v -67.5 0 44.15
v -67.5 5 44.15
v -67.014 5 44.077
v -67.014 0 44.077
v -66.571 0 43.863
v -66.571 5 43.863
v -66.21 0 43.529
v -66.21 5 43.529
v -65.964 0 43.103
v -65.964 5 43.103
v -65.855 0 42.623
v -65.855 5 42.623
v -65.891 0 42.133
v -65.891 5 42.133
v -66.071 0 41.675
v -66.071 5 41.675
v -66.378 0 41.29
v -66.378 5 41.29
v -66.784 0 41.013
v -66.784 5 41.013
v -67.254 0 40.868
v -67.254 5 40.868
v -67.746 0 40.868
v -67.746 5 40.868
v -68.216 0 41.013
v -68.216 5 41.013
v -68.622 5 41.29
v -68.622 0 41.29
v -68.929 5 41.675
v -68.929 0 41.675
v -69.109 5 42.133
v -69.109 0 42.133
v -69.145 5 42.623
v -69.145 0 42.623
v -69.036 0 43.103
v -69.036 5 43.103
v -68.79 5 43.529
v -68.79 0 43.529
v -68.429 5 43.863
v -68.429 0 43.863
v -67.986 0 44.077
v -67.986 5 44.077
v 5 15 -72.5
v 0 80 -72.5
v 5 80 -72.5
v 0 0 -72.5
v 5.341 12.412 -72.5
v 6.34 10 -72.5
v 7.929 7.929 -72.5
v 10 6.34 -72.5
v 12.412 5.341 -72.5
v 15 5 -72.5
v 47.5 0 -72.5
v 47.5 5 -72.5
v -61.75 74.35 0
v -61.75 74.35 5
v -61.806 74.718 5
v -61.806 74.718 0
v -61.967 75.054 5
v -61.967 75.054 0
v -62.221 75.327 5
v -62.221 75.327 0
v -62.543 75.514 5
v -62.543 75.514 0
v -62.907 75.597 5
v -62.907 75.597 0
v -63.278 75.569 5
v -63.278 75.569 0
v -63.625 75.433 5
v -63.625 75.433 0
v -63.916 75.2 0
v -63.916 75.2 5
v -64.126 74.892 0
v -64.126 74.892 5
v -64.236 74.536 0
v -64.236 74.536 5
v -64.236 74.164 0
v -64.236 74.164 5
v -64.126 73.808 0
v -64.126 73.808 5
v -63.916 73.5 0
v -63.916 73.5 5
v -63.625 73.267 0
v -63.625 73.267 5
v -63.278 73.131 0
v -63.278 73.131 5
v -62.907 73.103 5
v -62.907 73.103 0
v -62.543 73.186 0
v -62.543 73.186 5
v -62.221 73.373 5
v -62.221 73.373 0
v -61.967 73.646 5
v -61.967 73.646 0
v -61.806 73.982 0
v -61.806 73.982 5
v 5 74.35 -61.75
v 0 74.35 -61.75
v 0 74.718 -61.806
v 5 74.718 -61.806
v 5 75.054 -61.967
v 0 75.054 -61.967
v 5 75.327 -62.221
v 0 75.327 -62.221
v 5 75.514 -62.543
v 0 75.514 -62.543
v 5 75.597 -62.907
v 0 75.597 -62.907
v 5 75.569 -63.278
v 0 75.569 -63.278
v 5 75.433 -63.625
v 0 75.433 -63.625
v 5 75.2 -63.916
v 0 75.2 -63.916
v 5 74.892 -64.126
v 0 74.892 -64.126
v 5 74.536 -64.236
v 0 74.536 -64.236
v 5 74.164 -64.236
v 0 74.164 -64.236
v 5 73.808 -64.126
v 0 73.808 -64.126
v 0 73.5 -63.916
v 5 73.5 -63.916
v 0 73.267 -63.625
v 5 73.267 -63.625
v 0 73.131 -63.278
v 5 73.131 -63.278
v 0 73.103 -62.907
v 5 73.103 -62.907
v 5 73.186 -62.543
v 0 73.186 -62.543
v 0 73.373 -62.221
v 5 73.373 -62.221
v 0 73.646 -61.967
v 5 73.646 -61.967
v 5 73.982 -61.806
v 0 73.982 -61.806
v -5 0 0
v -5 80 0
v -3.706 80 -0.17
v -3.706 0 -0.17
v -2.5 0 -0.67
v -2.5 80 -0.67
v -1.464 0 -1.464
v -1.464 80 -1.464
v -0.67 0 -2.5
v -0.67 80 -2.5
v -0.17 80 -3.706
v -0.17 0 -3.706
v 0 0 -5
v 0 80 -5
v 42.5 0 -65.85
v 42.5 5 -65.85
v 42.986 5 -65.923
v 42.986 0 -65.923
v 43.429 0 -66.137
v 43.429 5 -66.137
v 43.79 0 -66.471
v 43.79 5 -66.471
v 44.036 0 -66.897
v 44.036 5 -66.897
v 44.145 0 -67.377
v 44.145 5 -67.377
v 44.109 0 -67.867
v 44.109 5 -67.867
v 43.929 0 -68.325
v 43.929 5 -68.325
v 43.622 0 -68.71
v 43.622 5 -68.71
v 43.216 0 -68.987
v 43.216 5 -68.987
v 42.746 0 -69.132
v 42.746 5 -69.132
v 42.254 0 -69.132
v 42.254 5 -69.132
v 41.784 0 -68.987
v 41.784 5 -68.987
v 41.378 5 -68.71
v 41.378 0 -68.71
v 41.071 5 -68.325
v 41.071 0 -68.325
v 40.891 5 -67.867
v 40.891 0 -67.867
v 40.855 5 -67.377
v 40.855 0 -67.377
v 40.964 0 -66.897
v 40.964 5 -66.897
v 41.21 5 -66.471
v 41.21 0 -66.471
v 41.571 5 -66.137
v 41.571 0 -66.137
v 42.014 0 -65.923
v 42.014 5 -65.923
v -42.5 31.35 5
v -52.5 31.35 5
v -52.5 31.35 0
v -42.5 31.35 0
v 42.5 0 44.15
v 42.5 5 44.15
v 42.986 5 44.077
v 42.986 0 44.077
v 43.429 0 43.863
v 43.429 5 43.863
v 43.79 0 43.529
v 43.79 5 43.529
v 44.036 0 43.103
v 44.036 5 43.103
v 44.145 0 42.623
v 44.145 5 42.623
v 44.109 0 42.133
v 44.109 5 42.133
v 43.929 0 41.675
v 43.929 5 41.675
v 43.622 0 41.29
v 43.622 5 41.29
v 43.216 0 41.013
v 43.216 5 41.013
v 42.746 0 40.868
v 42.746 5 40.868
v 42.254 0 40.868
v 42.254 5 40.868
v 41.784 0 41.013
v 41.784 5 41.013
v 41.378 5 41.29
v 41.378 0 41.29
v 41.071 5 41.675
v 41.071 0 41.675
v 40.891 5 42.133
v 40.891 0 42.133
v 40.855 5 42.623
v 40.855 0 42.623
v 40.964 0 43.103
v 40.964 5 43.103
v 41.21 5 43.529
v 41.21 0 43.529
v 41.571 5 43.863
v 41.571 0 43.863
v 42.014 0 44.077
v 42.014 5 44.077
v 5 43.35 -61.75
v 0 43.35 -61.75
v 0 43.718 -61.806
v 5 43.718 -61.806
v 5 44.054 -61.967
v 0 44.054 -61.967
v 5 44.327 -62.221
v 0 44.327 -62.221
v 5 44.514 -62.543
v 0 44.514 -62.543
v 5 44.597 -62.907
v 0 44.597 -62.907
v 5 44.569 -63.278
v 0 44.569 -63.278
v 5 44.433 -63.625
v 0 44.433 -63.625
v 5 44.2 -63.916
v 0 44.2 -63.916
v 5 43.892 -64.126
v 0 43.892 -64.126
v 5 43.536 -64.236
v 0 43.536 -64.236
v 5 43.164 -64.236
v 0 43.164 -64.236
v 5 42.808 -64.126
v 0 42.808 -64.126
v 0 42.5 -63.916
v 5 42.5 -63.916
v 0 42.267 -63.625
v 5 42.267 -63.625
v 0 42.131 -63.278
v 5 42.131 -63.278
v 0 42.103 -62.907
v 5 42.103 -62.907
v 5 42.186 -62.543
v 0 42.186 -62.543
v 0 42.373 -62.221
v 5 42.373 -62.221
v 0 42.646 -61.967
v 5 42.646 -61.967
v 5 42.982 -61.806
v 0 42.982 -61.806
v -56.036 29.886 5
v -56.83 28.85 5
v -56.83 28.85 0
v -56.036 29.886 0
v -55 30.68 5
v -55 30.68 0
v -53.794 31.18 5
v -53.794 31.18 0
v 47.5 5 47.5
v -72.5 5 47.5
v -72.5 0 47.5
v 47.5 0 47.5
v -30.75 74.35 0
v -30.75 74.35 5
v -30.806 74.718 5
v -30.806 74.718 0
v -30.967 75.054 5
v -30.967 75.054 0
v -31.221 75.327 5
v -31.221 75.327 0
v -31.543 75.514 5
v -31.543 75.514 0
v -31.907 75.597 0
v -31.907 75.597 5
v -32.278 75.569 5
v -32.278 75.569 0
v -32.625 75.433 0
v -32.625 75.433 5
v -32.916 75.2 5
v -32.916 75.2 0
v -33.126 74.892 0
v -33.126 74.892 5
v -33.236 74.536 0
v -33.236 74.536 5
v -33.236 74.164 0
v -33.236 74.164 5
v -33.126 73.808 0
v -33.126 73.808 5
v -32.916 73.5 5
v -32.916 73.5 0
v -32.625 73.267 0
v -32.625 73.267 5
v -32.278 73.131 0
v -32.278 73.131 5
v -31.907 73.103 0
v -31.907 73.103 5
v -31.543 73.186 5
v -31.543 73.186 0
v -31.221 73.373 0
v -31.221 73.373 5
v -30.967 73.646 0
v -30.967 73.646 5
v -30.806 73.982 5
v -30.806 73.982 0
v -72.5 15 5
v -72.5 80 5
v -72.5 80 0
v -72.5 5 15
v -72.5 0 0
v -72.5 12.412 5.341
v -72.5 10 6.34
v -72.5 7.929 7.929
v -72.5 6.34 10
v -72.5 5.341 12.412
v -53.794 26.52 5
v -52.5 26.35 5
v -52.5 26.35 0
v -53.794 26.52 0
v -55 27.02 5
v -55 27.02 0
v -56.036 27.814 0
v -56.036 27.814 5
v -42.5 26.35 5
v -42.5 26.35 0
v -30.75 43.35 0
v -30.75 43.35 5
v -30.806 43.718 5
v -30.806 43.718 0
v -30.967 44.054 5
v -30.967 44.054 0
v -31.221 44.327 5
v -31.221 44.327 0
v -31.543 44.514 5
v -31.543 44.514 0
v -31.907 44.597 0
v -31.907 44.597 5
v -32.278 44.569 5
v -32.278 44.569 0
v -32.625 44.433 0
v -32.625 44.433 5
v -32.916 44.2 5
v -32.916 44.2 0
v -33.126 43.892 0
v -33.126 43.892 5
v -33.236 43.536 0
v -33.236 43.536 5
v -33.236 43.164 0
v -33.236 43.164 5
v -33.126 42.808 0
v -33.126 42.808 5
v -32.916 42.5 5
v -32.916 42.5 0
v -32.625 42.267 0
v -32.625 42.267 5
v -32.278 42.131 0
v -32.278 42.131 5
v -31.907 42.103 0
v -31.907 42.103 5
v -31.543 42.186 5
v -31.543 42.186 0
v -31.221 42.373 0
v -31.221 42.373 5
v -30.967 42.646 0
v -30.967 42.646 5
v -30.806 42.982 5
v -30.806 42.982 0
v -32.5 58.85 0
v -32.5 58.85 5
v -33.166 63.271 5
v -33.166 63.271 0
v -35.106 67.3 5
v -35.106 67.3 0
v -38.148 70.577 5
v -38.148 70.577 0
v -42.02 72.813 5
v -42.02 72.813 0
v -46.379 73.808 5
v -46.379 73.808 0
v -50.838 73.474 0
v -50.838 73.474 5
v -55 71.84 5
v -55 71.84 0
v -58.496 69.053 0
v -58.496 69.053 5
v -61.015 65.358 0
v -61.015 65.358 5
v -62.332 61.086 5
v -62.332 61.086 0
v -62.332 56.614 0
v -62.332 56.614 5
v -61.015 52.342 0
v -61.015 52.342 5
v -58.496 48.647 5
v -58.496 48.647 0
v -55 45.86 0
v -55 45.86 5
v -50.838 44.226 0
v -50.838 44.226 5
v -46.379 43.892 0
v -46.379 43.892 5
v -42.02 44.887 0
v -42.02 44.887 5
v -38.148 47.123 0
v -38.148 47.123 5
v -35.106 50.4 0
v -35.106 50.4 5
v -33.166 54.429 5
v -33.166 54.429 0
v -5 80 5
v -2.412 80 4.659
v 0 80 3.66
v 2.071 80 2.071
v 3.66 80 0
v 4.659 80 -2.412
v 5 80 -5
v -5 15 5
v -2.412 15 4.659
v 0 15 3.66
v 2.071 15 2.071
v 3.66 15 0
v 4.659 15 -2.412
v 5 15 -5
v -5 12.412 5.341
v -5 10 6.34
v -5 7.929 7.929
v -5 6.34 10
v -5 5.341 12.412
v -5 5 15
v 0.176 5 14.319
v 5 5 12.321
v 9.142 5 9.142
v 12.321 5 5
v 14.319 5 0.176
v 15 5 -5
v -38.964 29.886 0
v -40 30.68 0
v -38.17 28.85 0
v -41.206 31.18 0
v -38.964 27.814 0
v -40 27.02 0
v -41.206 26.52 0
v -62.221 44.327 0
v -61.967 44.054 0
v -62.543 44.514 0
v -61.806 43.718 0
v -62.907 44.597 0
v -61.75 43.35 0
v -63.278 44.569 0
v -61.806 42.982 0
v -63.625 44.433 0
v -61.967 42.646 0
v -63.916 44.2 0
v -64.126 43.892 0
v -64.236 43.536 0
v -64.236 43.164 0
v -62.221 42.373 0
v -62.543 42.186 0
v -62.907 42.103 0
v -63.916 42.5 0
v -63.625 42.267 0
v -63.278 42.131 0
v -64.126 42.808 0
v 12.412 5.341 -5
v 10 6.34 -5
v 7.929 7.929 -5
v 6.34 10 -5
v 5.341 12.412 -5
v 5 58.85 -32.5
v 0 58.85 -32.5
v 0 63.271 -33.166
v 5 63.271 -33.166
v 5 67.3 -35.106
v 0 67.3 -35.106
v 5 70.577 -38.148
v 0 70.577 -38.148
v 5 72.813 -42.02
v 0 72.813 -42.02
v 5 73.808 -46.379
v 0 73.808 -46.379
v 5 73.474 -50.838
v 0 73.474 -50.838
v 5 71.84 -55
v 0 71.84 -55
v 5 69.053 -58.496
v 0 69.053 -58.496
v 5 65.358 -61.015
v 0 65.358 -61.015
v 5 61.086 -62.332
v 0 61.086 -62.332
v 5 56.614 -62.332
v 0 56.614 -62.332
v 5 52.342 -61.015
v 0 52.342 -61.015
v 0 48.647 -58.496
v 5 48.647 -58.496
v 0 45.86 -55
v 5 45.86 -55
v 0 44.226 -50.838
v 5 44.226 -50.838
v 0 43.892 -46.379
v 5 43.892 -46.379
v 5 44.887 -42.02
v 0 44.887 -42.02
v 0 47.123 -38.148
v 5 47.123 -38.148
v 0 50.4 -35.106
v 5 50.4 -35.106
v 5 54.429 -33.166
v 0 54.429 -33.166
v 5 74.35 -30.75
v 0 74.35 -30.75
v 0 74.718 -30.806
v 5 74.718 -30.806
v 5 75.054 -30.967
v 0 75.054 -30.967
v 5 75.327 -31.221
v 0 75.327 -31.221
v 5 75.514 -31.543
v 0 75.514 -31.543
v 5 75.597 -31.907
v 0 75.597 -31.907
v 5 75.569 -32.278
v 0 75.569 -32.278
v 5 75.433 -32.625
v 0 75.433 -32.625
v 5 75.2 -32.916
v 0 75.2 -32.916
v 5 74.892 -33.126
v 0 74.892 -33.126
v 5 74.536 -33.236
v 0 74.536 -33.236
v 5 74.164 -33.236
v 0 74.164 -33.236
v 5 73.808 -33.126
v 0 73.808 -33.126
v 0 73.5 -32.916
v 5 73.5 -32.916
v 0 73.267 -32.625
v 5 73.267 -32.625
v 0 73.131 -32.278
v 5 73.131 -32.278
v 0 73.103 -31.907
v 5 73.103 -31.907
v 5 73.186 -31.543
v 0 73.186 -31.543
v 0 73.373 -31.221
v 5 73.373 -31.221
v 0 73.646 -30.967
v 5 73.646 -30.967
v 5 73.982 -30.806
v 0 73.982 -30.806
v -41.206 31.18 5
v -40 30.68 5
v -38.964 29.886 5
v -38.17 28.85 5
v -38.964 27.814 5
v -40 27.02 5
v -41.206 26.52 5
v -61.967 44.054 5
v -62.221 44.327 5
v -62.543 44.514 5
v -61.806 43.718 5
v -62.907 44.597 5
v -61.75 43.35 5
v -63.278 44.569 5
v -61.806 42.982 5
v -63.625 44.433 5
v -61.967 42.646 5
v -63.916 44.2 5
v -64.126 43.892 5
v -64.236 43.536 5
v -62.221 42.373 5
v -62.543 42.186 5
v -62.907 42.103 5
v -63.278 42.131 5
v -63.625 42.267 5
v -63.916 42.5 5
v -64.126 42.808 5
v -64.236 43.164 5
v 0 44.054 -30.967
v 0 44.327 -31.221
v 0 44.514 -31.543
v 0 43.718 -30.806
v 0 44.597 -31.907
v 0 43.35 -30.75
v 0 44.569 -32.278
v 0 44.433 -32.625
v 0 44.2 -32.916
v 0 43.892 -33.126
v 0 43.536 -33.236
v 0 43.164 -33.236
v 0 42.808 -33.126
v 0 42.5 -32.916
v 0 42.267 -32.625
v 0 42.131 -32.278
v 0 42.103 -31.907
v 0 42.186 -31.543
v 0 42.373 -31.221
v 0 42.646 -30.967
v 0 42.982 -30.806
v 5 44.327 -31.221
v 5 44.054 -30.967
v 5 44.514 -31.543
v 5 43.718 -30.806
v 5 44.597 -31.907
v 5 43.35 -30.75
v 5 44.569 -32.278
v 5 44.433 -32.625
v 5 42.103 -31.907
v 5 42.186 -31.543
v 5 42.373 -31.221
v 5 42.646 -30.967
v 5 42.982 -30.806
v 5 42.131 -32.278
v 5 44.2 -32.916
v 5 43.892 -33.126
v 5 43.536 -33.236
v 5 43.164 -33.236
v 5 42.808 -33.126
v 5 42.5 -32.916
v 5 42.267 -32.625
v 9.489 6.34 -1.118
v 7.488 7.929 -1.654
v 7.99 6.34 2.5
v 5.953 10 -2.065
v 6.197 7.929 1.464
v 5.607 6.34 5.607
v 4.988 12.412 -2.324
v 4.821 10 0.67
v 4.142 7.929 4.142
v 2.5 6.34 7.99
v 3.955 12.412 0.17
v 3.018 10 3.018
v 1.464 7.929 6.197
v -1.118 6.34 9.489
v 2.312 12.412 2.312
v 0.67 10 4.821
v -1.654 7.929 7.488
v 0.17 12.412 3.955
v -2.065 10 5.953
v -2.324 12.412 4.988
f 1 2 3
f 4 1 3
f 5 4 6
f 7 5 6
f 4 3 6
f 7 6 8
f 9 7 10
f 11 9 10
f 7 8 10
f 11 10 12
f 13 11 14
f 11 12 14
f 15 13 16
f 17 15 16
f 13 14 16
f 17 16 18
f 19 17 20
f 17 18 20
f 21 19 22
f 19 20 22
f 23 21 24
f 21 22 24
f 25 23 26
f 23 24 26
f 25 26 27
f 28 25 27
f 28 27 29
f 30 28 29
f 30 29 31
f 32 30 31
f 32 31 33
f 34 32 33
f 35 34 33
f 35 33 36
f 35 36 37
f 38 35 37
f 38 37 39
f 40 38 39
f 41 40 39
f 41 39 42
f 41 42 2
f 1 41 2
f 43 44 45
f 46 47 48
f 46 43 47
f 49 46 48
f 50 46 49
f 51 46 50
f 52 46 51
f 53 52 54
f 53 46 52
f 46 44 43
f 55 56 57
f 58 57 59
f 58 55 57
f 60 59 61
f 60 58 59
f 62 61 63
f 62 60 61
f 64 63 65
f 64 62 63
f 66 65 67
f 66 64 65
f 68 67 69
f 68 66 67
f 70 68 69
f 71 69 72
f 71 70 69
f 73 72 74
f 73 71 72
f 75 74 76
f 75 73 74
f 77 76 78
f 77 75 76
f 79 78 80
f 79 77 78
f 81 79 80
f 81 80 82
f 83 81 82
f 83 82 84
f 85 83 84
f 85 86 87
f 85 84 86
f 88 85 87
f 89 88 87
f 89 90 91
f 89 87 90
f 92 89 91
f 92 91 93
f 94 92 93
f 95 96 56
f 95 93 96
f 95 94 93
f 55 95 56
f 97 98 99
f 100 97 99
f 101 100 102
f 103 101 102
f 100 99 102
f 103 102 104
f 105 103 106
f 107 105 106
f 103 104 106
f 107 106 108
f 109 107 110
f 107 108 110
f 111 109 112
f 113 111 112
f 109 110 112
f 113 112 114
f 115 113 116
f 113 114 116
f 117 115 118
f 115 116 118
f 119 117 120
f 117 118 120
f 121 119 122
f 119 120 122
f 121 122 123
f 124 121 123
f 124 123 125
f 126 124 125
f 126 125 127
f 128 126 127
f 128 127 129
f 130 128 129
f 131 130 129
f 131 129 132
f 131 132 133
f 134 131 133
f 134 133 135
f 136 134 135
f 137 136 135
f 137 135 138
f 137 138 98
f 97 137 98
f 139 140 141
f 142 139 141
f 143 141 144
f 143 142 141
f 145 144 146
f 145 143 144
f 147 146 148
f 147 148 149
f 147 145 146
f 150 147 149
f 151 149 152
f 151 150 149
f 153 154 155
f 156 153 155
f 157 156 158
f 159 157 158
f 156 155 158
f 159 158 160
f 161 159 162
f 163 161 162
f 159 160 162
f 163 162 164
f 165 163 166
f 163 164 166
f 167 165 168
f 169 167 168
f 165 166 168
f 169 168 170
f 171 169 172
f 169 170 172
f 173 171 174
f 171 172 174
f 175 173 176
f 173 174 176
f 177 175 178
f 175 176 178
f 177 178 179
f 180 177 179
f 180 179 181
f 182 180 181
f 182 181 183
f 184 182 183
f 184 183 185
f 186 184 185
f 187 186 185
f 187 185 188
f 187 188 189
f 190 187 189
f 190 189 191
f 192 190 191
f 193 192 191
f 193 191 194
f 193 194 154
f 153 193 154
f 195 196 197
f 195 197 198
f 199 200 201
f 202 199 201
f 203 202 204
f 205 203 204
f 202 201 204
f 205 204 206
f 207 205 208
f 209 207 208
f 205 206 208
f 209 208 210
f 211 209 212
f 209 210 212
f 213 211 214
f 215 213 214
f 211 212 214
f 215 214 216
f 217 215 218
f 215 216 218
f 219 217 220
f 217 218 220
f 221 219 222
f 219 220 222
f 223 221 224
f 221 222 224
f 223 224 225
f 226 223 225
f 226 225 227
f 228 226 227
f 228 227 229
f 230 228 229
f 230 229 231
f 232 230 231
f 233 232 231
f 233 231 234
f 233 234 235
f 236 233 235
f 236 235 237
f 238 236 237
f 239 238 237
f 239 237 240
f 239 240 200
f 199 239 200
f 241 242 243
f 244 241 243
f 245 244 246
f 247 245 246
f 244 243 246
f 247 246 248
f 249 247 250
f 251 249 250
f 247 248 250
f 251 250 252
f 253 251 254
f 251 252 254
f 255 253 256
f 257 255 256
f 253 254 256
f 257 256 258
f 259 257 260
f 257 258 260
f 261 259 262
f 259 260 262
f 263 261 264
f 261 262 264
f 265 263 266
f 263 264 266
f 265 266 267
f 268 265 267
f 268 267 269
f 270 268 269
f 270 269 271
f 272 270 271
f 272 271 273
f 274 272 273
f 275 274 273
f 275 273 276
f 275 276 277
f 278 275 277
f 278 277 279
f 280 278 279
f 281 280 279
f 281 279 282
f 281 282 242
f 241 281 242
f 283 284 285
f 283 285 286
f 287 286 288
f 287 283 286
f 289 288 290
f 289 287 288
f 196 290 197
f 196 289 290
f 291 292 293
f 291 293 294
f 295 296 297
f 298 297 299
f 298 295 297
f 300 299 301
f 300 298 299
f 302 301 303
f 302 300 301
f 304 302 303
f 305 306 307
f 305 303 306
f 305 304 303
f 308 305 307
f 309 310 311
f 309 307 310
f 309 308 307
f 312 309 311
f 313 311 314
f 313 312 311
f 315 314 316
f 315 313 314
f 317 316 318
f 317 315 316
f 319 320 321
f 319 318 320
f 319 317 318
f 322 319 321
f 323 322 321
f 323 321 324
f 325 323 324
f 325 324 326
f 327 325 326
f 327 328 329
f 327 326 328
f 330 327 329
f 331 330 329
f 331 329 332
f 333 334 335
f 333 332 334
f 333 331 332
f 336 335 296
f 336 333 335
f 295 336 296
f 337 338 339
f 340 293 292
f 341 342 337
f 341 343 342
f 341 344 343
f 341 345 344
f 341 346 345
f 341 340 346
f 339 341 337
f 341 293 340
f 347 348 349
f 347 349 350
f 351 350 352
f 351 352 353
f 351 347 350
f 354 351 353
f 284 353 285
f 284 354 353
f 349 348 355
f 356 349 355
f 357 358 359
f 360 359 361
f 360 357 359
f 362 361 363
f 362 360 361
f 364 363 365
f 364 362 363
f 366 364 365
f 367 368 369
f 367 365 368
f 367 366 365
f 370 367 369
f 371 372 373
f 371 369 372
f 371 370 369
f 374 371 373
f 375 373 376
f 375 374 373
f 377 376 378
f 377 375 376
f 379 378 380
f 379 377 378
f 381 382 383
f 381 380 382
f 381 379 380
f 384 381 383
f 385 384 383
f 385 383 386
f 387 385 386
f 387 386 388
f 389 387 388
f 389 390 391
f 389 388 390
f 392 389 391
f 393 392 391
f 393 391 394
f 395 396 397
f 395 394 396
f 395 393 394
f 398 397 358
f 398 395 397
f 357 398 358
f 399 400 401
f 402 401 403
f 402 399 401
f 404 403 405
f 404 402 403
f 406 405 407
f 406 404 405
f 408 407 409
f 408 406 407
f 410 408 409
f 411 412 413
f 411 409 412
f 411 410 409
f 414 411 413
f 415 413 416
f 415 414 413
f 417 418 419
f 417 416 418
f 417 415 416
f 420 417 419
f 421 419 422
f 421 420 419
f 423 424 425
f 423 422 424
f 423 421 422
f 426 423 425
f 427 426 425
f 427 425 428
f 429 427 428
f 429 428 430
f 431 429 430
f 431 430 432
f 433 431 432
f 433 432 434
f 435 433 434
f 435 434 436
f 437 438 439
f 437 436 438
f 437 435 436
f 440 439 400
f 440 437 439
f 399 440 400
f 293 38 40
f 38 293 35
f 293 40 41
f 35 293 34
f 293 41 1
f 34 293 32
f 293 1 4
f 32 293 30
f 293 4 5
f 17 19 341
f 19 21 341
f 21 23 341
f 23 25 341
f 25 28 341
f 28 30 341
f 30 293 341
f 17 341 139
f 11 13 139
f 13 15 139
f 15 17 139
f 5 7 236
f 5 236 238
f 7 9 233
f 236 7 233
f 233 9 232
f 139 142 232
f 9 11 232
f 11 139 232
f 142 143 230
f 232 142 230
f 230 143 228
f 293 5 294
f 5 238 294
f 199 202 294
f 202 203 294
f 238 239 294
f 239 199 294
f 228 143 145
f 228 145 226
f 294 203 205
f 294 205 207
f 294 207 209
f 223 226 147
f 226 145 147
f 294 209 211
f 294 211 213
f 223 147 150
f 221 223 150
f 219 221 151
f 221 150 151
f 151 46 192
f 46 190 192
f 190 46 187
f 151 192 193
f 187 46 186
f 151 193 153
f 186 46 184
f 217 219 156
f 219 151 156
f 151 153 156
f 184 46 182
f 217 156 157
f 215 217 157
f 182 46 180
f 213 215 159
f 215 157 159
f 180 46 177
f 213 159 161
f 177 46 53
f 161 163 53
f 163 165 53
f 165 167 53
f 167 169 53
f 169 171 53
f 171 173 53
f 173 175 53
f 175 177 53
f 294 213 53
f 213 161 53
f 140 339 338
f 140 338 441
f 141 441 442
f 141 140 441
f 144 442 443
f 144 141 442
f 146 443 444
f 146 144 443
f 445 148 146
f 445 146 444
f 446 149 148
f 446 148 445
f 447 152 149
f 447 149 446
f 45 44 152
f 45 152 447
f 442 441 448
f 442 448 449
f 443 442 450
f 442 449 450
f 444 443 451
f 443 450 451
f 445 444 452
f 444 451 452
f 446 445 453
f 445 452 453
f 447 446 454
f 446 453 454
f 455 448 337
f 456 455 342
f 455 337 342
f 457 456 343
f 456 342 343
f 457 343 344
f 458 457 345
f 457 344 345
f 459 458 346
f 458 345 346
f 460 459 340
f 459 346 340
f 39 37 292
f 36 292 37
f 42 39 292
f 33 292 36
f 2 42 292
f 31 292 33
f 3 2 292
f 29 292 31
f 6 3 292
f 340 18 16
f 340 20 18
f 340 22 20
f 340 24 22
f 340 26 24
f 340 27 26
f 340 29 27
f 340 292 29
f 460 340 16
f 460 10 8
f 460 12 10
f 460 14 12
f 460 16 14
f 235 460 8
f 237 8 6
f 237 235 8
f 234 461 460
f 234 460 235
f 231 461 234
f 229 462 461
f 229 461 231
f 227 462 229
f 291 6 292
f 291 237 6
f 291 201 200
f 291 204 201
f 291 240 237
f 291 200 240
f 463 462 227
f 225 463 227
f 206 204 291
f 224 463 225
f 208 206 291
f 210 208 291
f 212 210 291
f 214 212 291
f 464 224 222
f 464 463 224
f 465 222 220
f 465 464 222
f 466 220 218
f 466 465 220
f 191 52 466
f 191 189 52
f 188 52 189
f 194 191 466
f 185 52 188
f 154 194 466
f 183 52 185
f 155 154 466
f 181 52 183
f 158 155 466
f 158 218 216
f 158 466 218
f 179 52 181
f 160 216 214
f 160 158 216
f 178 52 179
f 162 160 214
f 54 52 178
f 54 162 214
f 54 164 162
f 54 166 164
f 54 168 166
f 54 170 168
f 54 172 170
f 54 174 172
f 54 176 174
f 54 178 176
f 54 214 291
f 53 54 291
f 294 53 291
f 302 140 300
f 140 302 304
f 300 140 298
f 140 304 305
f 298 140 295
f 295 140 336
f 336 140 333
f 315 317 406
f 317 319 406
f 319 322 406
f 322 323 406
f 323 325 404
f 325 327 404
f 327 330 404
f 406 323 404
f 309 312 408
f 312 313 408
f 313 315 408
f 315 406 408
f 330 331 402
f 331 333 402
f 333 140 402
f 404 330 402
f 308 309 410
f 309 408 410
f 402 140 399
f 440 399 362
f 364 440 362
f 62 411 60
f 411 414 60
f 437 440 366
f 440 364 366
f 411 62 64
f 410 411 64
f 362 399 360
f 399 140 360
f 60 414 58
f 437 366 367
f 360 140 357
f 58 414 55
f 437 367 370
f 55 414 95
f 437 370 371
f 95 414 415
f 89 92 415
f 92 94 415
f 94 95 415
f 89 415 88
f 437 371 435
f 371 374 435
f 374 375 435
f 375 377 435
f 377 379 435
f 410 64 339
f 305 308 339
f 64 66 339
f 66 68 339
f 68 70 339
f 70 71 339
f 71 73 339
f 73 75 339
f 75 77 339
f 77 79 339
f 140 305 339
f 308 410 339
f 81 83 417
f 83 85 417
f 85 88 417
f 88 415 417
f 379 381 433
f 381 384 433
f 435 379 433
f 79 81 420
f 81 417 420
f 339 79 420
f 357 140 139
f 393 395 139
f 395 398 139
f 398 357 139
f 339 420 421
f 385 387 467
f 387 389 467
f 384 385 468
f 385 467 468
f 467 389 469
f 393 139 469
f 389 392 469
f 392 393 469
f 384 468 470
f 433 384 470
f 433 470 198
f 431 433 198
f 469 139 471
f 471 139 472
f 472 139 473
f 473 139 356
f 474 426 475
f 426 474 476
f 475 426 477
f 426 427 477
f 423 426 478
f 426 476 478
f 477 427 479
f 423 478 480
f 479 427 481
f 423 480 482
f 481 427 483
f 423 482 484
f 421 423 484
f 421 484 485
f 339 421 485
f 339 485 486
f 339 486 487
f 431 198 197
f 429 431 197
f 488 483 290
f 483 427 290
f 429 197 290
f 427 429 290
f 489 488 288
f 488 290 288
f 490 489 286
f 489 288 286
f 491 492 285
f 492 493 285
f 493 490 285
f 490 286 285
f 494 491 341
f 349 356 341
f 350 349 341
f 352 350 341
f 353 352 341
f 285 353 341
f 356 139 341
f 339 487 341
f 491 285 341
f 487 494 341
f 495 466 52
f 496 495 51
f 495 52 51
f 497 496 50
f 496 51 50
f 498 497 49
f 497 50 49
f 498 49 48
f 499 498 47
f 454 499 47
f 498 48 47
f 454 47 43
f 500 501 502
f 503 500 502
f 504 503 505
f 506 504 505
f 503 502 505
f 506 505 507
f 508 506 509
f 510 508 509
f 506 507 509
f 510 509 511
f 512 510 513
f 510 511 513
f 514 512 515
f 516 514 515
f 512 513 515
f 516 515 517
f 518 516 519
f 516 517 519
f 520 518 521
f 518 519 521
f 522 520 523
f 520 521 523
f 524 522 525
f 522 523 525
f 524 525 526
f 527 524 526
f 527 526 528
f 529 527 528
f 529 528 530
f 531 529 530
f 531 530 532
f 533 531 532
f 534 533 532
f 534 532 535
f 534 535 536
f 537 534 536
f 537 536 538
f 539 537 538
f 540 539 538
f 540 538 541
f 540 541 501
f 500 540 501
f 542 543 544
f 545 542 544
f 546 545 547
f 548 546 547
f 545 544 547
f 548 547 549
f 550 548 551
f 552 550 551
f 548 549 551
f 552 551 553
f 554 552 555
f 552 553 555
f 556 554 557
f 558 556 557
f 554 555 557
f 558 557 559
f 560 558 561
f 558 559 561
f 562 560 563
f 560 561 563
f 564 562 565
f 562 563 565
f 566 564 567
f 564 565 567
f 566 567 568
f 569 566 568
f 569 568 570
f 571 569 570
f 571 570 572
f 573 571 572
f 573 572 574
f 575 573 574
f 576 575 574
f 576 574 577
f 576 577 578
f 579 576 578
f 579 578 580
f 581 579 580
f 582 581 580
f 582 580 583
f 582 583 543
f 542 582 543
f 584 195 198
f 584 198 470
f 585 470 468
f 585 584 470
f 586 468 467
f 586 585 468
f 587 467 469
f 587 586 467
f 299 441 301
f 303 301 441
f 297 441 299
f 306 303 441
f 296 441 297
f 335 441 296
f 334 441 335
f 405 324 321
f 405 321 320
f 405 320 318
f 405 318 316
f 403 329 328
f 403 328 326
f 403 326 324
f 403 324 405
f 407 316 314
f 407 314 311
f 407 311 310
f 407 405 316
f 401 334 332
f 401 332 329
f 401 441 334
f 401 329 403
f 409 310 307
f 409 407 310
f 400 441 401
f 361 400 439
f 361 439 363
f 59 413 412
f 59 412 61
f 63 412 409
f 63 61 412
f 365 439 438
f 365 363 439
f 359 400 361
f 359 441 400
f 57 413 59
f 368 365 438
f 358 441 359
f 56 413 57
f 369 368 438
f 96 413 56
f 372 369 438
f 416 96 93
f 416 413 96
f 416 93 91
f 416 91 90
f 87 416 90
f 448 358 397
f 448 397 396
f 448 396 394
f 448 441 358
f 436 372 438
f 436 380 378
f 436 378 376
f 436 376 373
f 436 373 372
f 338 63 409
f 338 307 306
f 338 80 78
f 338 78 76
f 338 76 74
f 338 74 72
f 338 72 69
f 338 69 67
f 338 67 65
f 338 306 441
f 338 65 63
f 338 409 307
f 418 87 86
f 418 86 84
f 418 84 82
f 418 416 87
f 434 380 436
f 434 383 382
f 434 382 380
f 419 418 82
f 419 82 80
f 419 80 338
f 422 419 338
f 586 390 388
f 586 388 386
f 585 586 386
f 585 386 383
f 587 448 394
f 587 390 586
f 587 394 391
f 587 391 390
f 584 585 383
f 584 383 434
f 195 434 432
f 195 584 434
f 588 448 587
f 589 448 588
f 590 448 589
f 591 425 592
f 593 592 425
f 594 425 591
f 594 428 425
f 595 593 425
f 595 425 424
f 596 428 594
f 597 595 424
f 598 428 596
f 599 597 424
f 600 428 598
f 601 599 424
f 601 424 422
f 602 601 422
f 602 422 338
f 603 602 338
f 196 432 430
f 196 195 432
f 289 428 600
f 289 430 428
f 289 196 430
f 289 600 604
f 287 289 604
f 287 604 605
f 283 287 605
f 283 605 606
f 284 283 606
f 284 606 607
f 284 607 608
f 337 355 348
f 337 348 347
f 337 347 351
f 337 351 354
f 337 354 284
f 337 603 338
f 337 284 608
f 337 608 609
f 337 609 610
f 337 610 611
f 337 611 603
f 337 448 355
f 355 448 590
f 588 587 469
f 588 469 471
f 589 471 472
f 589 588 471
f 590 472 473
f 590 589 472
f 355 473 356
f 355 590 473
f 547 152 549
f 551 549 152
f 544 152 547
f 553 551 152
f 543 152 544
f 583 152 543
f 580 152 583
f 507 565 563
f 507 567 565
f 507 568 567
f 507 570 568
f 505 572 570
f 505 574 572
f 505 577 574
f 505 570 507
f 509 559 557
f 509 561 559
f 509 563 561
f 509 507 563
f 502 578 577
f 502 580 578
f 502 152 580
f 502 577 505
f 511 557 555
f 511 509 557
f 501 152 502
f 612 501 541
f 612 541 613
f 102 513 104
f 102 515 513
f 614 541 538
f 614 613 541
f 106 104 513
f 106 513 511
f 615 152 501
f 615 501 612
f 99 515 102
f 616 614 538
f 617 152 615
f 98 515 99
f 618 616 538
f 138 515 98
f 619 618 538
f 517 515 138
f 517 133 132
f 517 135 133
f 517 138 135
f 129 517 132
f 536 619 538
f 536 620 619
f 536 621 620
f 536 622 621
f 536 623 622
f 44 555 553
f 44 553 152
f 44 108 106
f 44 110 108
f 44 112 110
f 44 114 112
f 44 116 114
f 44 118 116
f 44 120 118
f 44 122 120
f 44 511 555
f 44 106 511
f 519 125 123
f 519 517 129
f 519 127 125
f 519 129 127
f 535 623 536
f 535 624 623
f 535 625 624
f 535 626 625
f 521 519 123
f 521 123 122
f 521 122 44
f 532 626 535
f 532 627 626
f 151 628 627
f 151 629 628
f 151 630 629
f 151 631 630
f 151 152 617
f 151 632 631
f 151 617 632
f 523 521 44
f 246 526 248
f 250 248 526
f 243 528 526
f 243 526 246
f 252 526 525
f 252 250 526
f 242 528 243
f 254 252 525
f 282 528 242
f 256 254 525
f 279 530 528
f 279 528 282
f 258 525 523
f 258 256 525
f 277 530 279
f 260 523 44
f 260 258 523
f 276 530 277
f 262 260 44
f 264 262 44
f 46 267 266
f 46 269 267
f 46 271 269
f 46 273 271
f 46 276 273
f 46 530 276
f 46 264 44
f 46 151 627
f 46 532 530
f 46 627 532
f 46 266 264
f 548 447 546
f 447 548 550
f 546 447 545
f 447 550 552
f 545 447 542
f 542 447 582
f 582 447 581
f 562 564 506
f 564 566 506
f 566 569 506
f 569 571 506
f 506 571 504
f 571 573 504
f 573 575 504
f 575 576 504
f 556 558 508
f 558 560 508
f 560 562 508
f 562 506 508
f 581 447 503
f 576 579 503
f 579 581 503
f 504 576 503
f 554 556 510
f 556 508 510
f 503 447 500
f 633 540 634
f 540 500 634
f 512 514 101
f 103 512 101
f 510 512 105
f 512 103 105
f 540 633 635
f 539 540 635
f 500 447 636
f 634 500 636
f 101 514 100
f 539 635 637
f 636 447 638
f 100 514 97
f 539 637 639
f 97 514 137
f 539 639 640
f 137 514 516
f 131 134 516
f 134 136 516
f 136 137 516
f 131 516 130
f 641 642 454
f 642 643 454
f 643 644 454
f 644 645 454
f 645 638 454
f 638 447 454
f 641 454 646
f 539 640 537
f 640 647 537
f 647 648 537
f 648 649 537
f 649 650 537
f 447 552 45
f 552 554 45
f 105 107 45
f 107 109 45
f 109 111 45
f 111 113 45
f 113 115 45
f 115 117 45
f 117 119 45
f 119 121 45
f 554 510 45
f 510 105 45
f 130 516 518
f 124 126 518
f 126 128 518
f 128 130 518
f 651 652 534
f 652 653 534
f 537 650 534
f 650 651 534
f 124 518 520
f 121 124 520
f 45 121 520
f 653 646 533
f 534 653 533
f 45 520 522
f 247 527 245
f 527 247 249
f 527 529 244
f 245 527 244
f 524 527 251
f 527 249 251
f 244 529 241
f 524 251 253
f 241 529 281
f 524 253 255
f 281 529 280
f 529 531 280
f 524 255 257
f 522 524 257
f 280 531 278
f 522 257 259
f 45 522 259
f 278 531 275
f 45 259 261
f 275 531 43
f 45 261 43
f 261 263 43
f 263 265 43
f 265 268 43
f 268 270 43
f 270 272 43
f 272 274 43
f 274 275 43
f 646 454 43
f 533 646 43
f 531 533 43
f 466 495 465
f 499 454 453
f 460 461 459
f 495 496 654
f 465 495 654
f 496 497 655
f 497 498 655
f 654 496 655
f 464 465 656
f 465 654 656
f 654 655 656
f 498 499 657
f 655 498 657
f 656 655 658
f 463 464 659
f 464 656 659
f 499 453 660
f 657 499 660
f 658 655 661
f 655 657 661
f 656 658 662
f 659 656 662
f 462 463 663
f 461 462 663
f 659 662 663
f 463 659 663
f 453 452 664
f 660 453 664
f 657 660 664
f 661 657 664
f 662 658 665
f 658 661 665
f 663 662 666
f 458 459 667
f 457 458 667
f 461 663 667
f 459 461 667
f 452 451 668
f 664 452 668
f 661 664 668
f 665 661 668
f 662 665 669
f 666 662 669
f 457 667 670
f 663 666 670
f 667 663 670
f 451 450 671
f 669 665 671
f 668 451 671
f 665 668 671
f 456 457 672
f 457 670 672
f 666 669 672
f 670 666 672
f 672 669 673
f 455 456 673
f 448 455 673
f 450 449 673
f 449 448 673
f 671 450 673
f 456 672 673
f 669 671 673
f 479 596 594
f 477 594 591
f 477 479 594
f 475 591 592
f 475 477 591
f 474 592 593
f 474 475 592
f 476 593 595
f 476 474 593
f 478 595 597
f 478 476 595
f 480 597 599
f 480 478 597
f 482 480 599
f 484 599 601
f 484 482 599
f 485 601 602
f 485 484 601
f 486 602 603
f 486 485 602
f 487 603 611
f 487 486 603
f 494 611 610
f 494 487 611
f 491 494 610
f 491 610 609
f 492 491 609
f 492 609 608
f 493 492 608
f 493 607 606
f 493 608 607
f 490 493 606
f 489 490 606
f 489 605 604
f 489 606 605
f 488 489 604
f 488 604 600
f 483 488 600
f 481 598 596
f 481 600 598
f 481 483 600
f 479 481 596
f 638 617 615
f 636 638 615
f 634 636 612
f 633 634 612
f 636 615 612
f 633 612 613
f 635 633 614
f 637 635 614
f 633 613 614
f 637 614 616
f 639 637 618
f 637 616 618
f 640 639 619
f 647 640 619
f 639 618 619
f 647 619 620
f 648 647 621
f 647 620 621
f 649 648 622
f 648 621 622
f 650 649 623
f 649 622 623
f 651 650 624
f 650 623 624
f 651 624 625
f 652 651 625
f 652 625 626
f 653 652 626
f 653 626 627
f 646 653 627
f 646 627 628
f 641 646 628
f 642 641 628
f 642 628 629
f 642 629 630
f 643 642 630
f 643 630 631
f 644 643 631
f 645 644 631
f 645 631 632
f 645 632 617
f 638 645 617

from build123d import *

# Parameters (mm, degrees)
BOSS_EXTRUDE1_DEPTH = 20
SKETCH2_W           = 5
SKETCH2_H           = 72.5
BOSS_EXTRUDE2_DEPTH = 60
SKETCH3_R           = 15
CUT_EXTRUDE1_DEPTH  = 100
SKETCH4_R           = 1.25
CUT_EXTRUDE2_DEPTH  = 100
SKETCH7_W           = 77.5
SKETCH7_H           = 5
BOSS_EXTRUDE6_DEPTH = 60
FILLET3_R           = 5
SKETCH8_W           = 25
SKETCH8_H           = 120
SKETCH8_H_2         = 25
SKETCH8_W_2         = 120
CUT_EXTRUDE3_DEPTH  = 100
SKETCH9_R           = 1.65
CUT_EXTRUDE4_DEPTH  = 100
SKETCH10_W          = 42.5
SKETCH10_H          = 42.5
SKETCH10_W_2        = 77.5
SKETCH10_H_2        = 77.5
CUT_EXTRUDE5_DEPTH  = 15
FILLET4_R           = 10
SKETCH11_W          = 20
SKETCH11_H          = 5
CUT_EXTRUDE6_DEPTH  = 6
FILLET5_R           = 5


with BuildPart() as part:
    # Sketch1 → Boss-Extrude1 (new body)
    with BuildSketch(Plane(origin=(0, 0, 0), x_dir=(1, 0, 0), z_dir=(0, 1, 0))):
        Polygon((72.5, 72.5), (0, 72.5), (0, 0), (-72.5, 0), (-72.5, -72.5), (72.5, -72.5), align=None)
    extrude(amount=BOSS_EXTRUDE1_DEPTH)

    # Sketch2 → Boss-Extrude2 (add)
    with BuildSketch(Plane(origin=(0, 20, 0), x_dir=(1, 0, 0), z_dir=(0, 1, 0))):
        with Locations((2.5, 36.25)):
            Rectangle(SKETCH2_W, SKETCH2_H)
    extrude(amount=BOSS_EXTRUDE2_DEPTH)

    # Sketch3 → Cut-Extrude1 (cut)
    with BuildSketch(Plane.ZY):
        with Locations((-47.5, 58.85)):
            Circle(SKETCH3_R)
    cut_extrude1 = extrude(amount=-CUT_EXTRUDE1_DEPTH, mode=Mode.SUBTRACT)

    # Sketch4 → Cut-Extrude2 (cut)
    with BuildSketch(Plane.ZY):
        with Locations((-32, 74.35)):
            Circle(SKETCH4_R)
        with Locations((-63, 74.35)):
            Circle(SKETCH4_R)
        with Locations((-63, 43.35)):
            Circle(SKETCH4_R)
        with Locations((-32, 43.35)):
            Circle(SKETCH4_R)
    cut_extrude2 = extrude(amount=-CUT_EXTRUDE2_DEPTH, mode=Mode.SUBTRACT)

    # Sketch7 → Boss-Extrude6 (add)
    with BuildSketch(Plane(origin=(0, 20, 0), x_dir=(1, 0, 0), z_dir=(0, 1, 0))):
        with Locations((-33.75, -2.5)):
            Rectangle(SKETCH7_W, SKETCH7_H)
    extrude(amount=BOSS_EXTRUDE6_DEPTH)

    # Mirror5: Cut-Extrude1, Cut-Extrude2 across plane
    add(cut_extrude1.mirror(Plane(origin=(0, 0, 0), x_dir=(0.7071067811865476, 0, 0.7071067811865475), z_dir=(-0.7071067811865475, 0, 0.7071067811865476))), mode=Mode.SUBTRACT)
    add(cut_extrude2.mirror(Plane(origin=(0, 0, 0), x_dir=(0.7071067811865476, 0, 0.7071067811865475), z_dir=(-0.7071067811865475, 0, 0.7071067811865476))), mode=Mode.SUBTRACT)

    # Fillet3
    fillet3_edges = [part.edges().sort_by_distance(p)[0] for p in [
        (0, 40, 0),
    ]]
    fillet(fillet3_edges, radius=FILLET3_R)

    # Sketch8 → Cut-Extrude3 (cut)
    with BuildSketch(Plane(origin=(0, 20, 0), x_dir=(1, 0, 0), z_dir=(0, 1, 0))):
        with Locations((60, 12.5)):
            Rectangle(SKETCH8_W, SKETCH8_H)
        with Locations((60, -60)):
            Rectangle(SKETCH8_W, SKETCH8_H_2)
        with Locations((-12.5, -60)):
            Rectangle(SKETCH8_W_2, SKETCH8_H_2)
    extrude(amount=-CUT_EXTRUDE3_DEPTH, mode=Mode.SUBTRACT)

    # Sketch9 → Cut-Extrude4 (cut)
    with BuildSketch(Plane(origin=(0, 20, 0), x_dir=(1, 0, 0), z_dir=(0, 1, 0))):
        with Locations(Location((42.5, 67.5, 0), (0, 0, 270))):
            Circle(SKETCH9_R)
        with Locations(Location((42.5, -42.5, 0), (0, 0, 270))):
            Circle(SKETCH9_R)
        with Locations(Location((-67.5, -42.5, 0), (0, 0, 270))):
            Circle(SKETCH9_R)
    extrude(amount=-CUT_EXTRUDE4_DEPTH, mode=Mode.SUBTRACT)

    # Sketch10 → Cut-Extrude5 (cut)
    with BuildSketch(Plane(origin=(0, 20, 0), x_dir=(1, 0, 0), z_dir=(0, 1, 0))):
        with Locations((26.25, -26.25)):
            Rectangle(SKETCH10_W, SKETCH10_H)
        with Locations((-33.75, -26.25)):
            Rectangle(SKETCH10_W_2, SKETCH10_H)
        with Locations((26.25, 33.75)):
            Rectangle(SKETCH10_W, SKETCH10_H_2)
    extrude(amount=-CUT_EXTRUDE5_DEPTH, mode=Mode.SUBTRACT)

    # Fillet4
    fillet4_edges = [part.edges().sort_by_distance(p)[0] for p in [
        (5, 5, -33.75),
        (-33.75, 5, 5),
        (5, 42.5, 5),
    ]]
    fillet(fillet4_edges, radius=FILLET4_R)

    # Sketch11 → Cut-Extrude6 (cut)
    with BuildSketch(Plane.XY.offset(5)):
        with Locations((-47.5, 28.85)):
            Rectangle(SKETCH11_W, SKETCH11_H)
    extrude(amount=-CUT_EXTRUDE6_DEPTH, mode=Mode.SUBTRACT)

    # Fillet5
    # the kernel refuses this fillet: 5 mm, written as the material it adds along each edge
    with BuildSketch(Plane(origin=(-57.5, 26.35, 5), x_dir=(1, 0, 0), z_dir=(0, 0, -1))) as fillet5_piece_1:
        with BuildLine():
            CenterArc((FILLET5_R, -FILLET5_R), FILLET5_R, 90, 90)
            Line((0, -FILLET5_R), (0, 0))
            Line((0, 0), (FILLET5_R, 0))
        make_face()
    extrude(amount=5)
    with BuildSketch(Plane(origin=(-57.5, 31.35, 5), x_dir=(1, 0, 0), z_dir=(0, 0, -1)), Plane(origin=(-37.5, 31.35, 5), x_dir=(0, -1, 0), z_dir=(0, 0, -1)), Plane(origin=(-37.5, 26.35, 5), x_dir=(-1, 0, 0), z_dir=(0, 0, -1))) as fillet5_piece_2:
        with BuildLine():
            CenterArc((FILLET5_R, FILLET5_R), FILLET5_R, 180, 90)
            Line((0, FILLET5_R), (0, 0))
            Line((0, 0), (FILLET5_R, 0))
        make_face()
    extrude(amount=5)


solid = part.part
